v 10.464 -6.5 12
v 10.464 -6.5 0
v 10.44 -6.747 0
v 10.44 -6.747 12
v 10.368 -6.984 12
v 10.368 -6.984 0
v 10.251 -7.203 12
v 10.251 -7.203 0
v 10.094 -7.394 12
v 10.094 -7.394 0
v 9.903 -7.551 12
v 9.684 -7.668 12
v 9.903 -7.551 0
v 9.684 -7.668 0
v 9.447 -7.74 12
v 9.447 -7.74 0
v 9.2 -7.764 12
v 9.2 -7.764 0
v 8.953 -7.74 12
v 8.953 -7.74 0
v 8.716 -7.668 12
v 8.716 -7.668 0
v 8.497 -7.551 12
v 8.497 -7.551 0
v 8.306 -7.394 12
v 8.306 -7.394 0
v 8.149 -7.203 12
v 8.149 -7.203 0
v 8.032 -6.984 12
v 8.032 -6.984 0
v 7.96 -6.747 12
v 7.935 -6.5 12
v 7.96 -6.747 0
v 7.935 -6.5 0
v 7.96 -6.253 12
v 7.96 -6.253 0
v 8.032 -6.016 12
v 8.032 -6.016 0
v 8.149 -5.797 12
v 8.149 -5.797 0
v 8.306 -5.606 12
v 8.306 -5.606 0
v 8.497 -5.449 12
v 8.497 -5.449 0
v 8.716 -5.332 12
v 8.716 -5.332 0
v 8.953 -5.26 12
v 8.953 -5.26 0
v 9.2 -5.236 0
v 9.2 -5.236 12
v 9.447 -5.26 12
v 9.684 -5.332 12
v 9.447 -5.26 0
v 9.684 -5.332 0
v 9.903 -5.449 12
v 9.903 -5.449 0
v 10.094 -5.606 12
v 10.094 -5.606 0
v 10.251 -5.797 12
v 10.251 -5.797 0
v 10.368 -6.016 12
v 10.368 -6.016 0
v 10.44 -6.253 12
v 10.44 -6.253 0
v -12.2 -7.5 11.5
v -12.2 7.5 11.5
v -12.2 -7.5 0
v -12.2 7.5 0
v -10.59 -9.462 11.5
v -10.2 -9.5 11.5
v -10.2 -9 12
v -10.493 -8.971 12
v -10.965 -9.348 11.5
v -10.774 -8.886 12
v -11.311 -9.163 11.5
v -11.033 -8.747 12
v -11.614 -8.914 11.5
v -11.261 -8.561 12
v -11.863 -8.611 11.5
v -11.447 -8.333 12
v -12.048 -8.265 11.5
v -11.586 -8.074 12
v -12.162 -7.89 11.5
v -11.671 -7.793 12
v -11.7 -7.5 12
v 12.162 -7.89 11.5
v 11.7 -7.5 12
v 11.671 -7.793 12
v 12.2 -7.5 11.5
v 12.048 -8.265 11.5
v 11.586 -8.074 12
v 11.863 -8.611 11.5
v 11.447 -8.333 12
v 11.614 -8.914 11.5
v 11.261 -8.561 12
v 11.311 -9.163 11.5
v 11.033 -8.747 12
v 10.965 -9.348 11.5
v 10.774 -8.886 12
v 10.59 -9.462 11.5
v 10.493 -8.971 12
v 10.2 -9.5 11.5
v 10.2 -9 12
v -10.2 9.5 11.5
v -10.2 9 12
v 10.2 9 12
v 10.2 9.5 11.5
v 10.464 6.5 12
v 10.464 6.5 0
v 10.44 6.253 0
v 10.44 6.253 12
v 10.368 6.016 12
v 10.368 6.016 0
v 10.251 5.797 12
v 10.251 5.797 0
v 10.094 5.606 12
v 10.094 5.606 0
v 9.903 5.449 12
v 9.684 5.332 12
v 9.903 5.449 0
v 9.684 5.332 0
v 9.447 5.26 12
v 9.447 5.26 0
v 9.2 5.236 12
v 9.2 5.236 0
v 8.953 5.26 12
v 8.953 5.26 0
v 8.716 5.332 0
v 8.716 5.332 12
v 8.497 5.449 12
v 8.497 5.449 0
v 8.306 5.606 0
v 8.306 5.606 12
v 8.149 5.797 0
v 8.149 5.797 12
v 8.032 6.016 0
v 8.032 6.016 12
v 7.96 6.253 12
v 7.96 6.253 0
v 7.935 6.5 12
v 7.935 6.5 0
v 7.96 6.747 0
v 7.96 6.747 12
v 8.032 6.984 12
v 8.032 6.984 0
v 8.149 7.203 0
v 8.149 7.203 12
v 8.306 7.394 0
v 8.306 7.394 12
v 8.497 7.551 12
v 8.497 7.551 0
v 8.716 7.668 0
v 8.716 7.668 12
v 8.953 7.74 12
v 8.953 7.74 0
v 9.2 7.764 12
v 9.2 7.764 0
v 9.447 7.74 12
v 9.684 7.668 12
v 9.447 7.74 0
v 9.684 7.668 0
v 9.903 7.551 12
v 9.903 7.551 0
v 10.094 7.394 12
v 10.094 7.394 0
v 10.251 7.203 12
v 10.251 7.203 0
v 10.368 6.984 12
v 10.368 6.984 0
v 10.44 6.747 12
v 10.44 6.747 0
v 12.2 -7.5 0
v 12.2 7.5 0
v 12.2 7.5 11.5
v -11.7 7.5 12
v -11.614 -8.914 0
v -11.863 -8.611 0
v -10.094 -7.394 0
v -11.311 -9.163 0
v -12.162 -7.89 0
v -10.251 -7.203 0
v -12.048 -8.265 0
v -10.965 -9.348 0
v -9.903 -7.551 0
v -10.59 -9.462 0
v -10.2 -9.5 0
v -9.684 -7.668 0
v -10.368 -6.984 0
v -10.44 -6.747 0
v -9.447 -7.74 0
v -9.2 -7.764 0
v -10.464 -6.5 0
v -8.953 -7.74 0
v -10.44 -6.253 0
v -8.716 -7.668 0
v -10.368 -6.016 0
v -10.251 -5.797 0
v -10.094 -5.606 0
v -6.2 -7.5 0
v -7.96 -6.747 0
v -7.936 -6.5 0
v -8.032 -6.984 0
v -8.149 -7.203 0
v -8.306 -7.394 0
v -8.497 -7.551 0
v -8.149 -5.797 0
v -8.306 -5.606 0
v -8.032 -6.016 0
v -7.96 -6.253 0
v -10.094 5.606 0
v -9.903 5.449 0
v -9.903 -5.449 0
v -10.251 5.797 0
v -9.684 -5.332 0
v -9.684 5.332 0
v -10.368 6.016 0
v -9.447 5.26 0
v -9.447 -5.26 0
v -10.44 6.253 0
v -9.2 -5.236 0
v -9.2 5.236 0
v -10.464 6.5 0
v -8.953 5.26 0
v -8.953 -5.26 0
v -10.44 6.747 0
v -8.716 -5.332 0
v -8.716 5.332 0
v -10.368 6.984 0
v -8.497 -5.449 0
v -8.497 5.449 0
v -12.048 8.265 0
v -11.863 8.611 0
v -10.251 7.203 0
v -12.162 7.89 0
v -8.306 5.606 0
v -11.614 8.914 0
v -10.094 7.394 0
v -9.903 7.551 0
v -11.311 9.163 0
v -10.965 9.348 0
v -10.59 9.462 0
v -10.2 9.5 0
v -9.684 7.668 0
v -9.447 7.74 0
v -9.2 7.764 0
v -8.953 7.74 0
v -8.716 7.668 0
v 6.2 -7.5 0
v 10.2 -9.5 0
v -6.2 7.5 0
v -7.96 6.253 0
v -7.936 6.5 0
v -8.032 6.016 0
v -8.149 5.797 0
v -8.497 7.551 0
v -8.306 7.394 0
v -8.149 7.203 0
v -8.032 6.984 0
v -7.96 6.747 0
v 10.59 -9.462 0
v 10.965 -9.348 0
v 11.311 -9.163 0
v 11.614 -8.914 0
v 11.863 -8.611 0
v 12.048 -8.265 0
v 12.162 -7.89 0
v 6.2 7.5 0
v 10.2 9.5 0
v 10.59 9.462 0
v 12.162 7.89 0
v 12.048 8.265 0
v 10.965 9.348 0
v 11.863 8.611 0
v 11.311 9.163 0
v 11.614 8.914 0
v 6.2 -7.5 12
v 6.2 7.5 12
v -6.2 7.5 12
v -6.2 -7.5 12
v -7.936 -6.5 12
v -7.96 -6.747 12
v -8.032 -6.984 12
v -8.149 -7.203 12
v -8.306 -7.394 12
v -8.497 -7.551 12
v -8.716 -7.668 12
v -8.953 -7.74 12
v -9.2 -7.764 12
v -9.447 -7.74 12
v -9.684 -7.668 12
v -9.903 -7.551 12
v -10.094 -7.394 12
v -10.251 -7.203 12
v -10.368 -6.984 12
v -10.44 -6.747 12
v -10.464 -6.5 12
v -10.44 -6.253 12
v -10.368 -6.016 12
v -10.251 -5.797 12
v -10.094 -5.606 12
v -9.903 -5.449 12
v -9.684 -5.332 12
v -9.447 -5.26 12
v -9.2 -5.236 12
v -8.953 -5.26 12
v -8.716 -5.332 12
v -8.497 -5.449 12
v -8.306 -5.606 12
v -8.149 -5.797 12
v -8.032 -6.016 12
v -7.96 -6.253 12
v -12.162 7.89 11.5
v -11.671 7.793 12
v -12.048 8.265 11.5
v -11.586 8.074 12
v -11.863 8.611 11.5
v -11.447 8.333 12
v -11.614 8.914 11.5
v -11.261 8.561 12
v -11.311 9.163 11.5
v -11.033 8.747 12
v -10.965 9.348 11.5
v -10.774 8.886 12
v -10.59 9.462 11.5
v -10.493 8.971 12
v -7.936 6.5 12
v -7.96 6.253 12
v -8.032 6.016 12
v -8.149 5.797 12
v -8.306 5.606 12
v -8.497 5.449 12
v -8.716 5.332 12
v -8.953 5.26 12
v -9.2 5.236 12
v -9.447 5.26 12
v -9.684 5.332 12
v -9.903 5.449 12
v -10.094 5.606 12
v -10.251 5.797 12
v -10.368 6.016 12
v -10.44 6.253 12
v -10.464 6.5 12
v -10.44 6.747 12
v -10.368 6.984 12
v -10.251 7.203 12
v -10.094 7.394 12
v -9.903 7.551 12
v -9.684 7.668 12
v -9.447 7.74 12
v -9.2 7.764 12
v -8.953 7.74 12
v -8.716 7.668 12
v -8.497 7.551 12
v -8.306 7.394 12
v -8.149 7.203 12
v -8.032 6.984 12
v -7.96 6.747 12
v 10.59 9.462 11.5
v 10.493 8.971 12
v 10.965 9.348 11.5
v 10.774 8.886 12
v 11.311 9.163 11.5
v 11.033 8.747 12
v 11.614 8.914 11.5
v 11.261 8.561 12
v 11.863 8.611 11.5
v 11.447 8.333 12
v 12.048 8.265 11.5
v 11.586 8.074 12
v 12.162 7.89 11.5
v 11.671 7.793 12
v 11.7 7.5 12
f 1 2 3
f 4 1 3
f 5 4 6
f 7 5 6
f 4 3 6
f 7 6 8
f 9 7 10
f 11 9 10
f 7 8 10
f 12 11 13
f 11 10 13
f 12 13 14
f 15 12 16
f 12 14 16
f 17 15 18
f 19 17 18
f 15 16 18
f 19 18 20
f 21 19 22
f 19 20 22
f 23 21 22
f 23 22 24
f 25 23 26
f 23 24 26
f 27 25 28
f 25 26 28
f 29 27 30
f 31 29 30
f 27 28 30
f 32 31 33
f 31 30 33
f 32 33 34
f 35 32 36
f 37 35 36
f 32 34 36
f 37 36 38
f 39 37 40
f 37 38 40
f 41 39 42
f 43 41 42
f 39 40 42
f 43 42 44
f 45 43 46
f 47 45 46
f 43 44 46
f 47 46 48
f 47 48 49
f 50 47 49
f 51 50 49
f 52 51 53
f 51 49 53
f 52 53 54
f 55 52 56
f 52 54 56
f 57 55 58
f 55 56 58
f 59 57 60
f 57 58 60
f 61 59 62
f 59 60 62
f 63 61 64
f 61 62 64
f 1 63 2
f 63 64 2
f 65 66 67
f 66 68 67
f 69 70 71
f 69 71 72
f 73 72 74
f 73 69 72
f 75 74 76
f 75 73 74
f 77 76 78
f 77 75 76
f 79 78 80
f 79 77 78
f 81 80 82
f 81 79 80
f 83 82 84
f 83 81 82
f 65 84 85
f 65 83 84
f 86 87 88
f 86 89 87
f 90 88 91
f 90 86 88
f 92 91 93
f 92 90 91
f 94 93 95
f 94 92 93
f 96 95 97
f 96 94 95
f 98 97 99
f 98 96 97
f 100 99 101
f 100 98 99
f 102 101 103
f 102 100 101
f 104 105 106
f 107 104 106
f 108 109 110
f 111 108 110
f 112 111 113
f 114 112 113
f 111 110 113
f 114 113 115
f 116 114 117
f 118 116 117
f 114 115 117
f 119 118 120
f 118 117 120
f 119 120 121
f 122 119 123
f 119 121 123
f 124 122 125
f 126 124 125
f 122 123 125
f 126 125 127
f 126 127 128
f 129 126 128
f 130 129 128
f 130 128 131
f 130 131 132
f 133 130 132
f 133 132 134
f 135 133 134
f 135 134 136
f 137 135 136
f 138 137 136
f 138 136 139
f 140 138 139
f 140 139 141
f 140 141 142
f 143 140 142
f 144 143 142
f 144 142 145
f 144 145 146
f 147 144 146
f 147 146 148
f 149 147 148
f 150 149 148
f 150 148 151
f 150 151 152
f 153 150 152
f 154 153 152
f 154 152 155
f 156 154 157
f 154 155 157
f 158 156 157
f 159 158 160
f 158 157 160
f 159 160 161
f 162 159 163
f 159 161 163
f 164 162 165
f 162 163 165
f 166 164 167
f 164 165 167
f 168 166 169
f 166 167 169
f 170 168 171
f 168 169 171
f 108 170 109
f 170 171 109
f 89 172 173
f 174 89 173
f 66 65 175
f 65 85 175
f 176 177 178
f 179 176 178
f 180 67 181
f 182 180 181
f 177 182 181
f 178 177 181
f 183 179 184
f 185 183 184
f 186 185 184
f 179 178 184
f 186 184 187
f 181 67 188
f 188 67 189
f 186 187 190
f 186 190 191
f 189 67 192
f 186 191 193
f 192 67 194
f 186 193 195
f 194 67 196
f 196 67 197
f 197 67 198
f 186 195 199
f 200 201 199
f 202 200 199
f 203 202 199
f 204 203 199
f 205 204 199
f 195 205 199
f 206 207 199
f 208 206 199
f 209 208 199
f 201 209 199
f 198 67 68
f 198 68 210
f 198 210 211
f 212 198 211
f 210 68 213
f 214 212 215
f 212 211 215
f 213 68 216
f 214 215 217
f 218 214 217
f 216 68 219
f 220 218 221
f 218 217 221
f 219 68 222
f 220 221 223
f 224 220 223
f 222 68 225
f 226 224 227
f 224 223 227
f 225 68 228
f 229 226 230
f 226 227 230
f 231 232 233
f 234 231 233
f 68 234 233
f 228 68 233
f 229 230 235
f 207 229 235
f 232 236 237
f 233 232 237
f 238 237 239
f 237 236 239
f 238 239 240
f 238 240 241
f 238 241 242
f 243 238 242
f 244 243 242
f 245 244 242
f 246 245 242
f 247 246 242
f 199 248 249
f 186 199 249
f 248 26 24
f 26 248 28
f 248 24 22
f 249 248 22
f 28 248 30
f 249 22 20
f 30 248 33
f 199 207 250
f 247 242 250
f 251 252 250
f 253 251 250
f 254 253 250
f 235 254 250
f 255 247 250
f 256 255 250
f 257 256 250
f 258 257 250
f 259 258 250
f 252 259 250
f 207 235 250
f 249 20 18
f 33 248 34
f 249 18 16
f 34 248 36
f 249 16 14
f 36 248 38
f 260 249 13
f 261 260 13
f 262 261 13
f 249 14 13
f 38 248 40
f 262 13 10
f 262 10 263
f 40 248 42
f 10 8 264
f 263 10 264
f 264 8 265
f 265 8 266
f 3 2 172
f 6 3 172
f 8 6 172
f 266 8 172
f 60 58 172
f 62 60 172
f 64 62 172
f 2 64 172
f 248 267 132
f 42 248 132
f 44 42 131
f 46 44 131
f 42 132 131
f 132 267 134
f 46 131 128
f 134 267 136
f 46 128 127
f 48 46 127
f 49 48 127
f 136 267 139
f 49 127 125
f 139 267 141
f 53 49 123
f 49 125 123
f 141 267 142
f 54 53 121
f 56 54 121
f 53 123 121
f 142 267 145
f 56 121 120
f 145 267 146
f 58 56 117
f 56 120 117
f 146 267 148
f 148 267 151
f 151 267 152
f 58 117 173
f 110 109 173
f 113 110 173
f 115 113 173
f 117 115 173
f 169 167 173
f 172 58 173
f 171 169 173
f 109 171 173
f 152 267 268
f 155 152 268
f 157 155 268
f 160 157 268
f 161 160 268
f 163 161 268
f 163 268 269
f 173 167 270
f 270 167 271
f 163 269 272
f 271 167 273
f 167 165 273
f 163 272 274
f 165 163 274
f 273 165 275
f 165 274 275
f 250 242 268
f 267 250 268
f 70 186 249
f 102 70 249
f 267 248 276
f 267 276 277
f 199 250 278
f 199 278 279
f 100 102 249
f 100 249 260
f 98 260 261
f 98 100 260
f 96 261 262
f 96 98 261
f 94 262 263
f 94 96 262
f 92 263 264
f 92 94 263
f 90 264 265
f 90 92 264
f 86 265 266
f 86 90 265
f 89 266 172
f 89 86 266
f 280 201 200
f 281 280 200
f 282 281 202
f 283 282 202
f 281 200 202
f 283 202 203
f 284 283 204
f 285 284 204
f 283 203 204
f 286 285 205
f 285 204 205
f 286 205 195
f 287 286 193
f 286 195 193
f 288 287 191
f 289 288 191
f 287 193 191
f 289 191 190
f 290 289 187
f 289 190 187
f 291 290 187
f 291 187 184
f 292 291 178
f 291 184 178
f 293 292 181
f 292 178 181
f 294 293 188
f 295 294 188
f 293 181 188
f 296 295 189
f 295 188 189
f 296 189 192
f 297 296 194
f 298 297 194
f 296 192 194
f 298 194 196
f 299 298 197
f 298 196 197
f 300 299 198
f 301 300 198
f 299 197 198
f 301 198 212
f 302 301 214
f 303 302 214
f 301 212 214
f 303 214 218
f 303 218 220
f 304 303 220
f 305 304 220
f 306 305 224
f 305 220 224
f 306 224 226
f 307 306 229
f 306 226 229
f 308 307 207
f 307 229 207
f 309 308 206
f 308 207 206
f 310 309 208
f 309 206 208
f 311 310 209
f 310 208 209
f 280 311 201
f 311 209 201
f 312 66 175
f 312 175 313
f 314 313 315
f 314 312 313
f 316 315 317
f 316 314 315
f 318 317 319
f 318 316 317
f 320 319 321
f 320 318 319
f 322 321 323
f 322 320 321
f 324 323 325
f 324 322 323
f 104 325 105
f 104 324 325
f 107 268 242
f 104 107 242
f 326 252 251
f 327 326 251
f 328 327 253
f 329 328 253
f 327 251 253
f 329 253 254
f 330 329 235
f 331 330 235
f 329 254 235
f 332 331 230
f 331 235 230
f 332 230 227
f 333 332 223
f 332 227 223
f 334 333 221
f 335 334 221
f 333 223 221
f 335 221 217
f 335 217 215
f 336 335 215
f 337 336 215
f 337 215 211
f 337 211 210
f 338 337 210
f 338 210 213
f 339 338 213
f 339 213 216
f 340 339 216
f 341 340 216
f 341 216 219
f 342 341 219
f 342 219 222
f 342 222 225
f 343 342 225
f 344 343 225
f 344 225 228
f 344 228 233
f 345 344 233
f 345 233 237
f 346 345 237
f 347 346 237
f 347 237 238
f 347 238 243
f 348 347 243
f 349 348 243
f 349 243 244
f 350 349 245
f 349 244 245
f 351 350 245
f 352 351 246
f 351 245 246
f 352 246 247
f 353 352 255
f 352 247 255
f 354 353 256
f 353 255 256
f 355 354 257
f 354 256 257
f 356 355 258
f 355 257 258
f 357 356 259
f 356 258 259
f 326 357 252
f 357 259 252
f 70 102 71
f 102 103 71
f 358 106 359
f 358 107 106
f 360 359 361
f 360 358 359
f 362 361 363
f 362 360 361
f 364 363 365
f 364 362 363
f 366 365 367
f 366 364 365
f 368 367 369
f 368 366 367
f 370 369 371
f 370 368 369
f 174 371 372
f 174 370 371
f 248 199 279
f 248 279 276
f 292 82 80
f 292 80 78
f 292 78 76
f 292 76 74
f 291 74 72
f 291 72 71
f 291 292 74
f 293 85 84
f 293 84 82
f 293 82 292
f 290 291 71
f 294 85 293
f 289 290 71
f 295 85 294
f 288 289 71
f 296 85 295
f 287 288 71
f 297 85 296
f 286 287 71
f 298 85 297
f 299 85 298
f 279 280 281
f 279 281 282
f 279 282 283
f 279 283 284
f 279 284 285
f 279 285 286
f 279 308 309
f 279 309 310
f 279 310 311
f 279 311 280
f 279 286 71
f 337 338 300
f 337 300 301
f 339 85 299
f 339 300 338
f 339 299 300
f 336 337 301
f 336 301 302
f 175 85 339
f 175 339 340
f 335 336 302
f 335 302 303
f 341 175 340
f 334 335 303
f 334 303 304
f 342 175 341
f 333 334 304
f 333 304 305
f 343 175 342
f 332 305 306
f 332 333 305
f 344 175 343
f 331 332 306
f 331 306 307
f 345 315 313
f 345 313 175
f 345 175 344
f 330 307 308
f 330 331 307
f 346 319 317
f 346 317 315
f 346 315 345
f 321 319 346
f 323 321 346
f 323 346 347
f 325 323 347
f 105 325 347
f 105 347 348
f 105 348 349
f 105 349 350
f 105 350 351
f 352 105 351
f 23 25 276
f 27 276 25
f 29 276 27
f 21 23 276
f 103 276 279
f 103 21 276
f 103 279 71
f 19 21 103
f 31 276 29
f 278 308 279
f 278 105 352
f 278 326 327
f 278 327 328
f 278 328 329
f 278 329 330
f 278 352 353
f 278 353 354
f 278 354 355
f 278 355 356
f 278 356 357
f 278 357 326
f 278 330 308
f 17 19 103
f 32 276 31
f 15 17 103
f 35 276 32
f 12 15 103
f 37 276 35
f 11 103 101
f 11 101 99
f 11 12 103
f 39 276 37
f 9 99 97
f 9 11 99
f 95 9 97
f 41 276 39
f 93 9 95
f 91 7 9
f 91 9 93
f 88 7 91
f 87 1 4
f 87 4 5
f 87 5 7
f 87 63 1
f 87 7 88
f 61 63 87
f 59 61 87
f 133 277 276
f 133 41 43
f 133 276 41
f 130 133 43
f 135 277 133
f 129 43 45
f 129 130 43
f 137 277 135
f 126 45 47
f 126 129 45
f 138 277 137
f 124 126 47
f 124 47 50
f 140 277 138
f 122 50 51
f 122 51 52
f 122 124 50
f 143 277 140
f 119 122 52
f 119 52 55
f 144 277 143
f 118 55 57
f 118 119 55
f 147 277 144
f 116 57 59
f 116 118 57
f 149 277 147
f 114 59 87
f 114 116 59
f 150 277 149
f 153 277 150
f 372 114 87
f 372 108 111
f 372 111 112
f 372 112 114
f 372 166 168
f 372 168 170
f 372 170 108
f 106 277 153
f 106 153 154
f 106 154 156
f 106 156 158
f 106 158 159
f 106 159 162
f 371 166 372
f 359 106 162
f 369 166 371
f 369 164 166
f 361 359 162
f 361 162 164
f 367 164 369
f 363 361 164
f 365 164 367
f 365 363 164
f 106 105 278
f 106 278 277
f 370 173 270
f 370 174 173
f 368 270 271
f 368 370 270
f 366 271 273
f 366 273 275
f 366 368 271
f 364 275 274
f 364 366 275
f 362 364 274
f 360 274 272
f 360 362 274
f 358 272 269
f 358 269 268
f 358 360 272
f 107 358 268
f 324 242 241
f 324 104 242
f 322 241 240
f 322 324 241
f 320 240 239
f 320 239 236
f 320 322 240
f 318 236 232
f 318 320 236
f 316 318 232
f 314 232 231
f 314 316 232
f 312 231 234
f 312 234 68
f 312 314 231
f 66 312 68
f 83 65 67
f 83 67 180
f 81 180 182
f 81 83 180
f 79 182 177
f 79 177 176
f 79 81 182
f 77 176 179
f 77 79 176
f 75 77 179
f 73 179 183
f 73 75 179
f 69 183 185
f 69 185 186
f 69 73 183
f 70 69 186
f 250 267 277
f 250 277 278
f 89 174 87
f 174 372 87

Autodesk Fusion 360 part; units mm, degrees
sketch "Sketch1" plane through (0, 0, 0) normal (0, 0, 1) x (1, 0, 0)
  line L0 (12.2, 9.5) -> (-12.2, 9.5)
  line L1 (-12.2, 9.5) -> (-12.2, -9.5)
  line L2 (-12.2, -9.5) -> (12.2, -9.5)
  line L3 (12.2, -9.5) -> (12.2, 9.5)
  line L4 (12.2, 9.5) -> (-12.2, -9.5) construction
  line L5 (-12.2, 9.5) -> (12.2, -9.5) construction
  line L6 (9.2, 6.5) -> (-9.2, 6.5) construction
  line L7 (-9.2, 6.5) -> (-9.2, -6.5) construction
  line L8 (-9.2, -6.5) -> (9.2, -6.5) construction
  line L9 (9.2, -6.5) -> (9.2, 6.5) construction
  line L10 (9.2, 6.5) -> (-9.2, -6.5) construction
  line L11 (-9.2, 6.5) -> (9.2, -6.5) construction
  circle A0 centre (9.2, 6.5) radius 1.5
  circle A1 centre (-9.2, -6.5) radius 1.5
  line L12 (0, 0) -> (9.2, 0) construction
  circle A2 centre (-9.2, 6.5) radius 1.5
  circle A3 centre (9.2, -6.5) radius 1.5
  line L13 (6.2, 7.5) -> (-6.2, 7.5)
  line L14 (-6.2, 7.5) -> (-6.2, -7.5)
  line L15 (-6.2, -7.5) -> (6.2, -7.5)
  line L16 (6.2, -7.5) -> (6.2, 7.5)
  line L17 (6.2, 7.5) -> (-6.2, -7.5) construction
  line L18 (-6.2, 7.5) -> (6.2, -7.5) construction
  line L19 (0, 0) -> (5.0501, 0) construction
  line L20 (19.3001, 18.69) -> (-9.2, 18.69) construction
  line L21 (-9.2, 18.69) -> (-9.2, -18.69) construction
  line L22 (-9.2, -18.69) -> (19.3001, -18.69) construction
  line L23 (19.3001, -18.69) -> (19.3001, 18.69) construction
  line L24 (19.3001, 18.69) -> (-9.2, -18.69) construction
  line L25 (-9.2, 18.69) -> (19.3001, -18.69) construction
  circle A4 centre (-9.2, 18.69) radius 1.5
  circle A5 centre (-9.2, -18.69) radius 1.5
  line L26 (-12.2, 21.69) -> (-4.2, 21.69)
  line L27 (-4.2, 21.69) -> (-4.2, -21.69)
  line L28 (-4.2, -21.69) -> (-12.2, -21.69)
  line L29 (-12.2, -21.69) -> (-12.2, 21.69)
  point P0 (5.0501, 0)
  dimension "d1" = 18.4
  dimension "d2" = 13
  dimension "d3" = 3
  dimension "d6" = 3
  dimension "d7" = 3
  dimension "d10" = 3
  dimension "d11" = 2
  dimension "d14" = 37.38
  dimension "d15" = 3
  dimension "d16" = 3
  dimension "d17" = 5
  dimension "d18" = 3
  dimension "d19" = 3
extrude "Extrude1" add sketch "Sketch1" along normal blind 12 contours L0 L2 L3 L13 L15 L16 L27 | L0 L1 L2 L13 L14 L15 L27 L29
fillet "Fillet1" radius 2 4 edges at (12.2, -9.5, 6) (12.2, 9.5, 6) (-12.2, 9.5, 6) (-12.2, -9.5, 6)
thread "Thread1" "ISO Metric profile 3.0 M3x0.5 6H" major diameter 3.086 minor diameter 2.529 pitch 0.5 angle 60 resizes the face on face at (-7.7019, -6.5748, 8) on face at (10.6981, -6.5748, 8) on face at (10.6981, 6.4252, 8) on face at (-7.7019, 6.4252, 8)
sketch "Sketch2" plane through (0, 0, 12) normal (0, 0, 1) x (1, 0, 0)
  line L0 (-12.2, 7.5) -> (-12.2, -7.5)
  line L1 (-10.2, -9.5) -> (10.2, -9.5)
  arc A0 (10.2, -9.5) -> (12.2, -7.5) centre (10.2, -7.5) ccw
  line L2 (12.2, -7.5) -> (12.2, 7.5)
  arc A1 (12.2, 7.5) -> (10.2, 9.5) centre (10.2, 7.5) ccw
  line L3 (10.2, 9.5) -> (-10.2, 9.5)
  line L4 (6.2, 7.5) -> (6.2, -7.5)
  line L5 (6.2, -7.5) -> (-6.2, -7.5)
  line L6 (-6.2, -7.5) -> (-6.2, 7.5)
  line L7 (-6.2, 7.5) -> (6.2, 7.5)
  circle A2 centre (9.2, 6.5) radius 1.2645
  circle A3 centre (-9.2, -6.5) radius 1.2645
  circle A4 centre (9.2, -6.5) radius 1.2645
  circle A5 centre (-9.2, 6.5) radius 1.2645
  line L8 (-12.2, -9.5) -> (-4.2, -9.5)
  line L9 (-4.2, -9.5) -> (-4.2, -14.69)
  line L10 (-4.2, -14.69) -> (-12.2, -14.69)
  line L11 (-12.2, -14.69) -> (-12.2, -9.5)
  line L12 (-4.2, -9.5) -> (-10.2, -9.5)
  line L13 (-4.2, -14.69) -> (-12.2, -14.69)
  line L14 (-12.2, -14.69) -> (-12.2, -11.69)
  line L15 (-12.2, -11.69) -> (-4.2, -11.69)
  line L16 (-4.2, -11.69) -> (-4.2, -14.69)
  line L17 (0, 0) -> (12.2, 0)
  line L18 (-12.2, 14.69) -> (-12.2, 9.5)
  line L19 (-12.2, 9.5) -> (-4.2, 9.5)
  line L20 (-4.2, 14.69) -> (-12.2, 14.69)
  line L21 (-12.2, 14.69) -> (-12.2, 11.69)
  line L22 (-4.2, 11.69) -> (-4.2, 14.69)
  line L23 (-12.2, 11.69) -> (-4.2, 11.69)
  line L24 (-4.2, 9.5) -> (-4.2, 14.69)
  line L25 (-4.2, 9.5) -> (-10.2, 9.5)
  arc A6 (-12.2, -7.5) -> (-10.2, -9.5) centre (-10.2, -7.5) ccw
  arc A7 (-10.2, 9.5) -> (-12.2, 7.5) centre (-10.2, 7.5) ccw
  dimension "d23" = 3
chamfer "Chamfer1" distance 0.5 angle 45 8 edges at (12.2, 0, 12) (11.6142, 8.9142, 12) (0, 9.5, 12) (-11.6142, 8.9142, 12) (-12.2, 0, 12) (-11.6142, -8.9142, 12) (0, -9.5, 12) (11.6142, -8.9142, 12)
equation "d19 = d18"
